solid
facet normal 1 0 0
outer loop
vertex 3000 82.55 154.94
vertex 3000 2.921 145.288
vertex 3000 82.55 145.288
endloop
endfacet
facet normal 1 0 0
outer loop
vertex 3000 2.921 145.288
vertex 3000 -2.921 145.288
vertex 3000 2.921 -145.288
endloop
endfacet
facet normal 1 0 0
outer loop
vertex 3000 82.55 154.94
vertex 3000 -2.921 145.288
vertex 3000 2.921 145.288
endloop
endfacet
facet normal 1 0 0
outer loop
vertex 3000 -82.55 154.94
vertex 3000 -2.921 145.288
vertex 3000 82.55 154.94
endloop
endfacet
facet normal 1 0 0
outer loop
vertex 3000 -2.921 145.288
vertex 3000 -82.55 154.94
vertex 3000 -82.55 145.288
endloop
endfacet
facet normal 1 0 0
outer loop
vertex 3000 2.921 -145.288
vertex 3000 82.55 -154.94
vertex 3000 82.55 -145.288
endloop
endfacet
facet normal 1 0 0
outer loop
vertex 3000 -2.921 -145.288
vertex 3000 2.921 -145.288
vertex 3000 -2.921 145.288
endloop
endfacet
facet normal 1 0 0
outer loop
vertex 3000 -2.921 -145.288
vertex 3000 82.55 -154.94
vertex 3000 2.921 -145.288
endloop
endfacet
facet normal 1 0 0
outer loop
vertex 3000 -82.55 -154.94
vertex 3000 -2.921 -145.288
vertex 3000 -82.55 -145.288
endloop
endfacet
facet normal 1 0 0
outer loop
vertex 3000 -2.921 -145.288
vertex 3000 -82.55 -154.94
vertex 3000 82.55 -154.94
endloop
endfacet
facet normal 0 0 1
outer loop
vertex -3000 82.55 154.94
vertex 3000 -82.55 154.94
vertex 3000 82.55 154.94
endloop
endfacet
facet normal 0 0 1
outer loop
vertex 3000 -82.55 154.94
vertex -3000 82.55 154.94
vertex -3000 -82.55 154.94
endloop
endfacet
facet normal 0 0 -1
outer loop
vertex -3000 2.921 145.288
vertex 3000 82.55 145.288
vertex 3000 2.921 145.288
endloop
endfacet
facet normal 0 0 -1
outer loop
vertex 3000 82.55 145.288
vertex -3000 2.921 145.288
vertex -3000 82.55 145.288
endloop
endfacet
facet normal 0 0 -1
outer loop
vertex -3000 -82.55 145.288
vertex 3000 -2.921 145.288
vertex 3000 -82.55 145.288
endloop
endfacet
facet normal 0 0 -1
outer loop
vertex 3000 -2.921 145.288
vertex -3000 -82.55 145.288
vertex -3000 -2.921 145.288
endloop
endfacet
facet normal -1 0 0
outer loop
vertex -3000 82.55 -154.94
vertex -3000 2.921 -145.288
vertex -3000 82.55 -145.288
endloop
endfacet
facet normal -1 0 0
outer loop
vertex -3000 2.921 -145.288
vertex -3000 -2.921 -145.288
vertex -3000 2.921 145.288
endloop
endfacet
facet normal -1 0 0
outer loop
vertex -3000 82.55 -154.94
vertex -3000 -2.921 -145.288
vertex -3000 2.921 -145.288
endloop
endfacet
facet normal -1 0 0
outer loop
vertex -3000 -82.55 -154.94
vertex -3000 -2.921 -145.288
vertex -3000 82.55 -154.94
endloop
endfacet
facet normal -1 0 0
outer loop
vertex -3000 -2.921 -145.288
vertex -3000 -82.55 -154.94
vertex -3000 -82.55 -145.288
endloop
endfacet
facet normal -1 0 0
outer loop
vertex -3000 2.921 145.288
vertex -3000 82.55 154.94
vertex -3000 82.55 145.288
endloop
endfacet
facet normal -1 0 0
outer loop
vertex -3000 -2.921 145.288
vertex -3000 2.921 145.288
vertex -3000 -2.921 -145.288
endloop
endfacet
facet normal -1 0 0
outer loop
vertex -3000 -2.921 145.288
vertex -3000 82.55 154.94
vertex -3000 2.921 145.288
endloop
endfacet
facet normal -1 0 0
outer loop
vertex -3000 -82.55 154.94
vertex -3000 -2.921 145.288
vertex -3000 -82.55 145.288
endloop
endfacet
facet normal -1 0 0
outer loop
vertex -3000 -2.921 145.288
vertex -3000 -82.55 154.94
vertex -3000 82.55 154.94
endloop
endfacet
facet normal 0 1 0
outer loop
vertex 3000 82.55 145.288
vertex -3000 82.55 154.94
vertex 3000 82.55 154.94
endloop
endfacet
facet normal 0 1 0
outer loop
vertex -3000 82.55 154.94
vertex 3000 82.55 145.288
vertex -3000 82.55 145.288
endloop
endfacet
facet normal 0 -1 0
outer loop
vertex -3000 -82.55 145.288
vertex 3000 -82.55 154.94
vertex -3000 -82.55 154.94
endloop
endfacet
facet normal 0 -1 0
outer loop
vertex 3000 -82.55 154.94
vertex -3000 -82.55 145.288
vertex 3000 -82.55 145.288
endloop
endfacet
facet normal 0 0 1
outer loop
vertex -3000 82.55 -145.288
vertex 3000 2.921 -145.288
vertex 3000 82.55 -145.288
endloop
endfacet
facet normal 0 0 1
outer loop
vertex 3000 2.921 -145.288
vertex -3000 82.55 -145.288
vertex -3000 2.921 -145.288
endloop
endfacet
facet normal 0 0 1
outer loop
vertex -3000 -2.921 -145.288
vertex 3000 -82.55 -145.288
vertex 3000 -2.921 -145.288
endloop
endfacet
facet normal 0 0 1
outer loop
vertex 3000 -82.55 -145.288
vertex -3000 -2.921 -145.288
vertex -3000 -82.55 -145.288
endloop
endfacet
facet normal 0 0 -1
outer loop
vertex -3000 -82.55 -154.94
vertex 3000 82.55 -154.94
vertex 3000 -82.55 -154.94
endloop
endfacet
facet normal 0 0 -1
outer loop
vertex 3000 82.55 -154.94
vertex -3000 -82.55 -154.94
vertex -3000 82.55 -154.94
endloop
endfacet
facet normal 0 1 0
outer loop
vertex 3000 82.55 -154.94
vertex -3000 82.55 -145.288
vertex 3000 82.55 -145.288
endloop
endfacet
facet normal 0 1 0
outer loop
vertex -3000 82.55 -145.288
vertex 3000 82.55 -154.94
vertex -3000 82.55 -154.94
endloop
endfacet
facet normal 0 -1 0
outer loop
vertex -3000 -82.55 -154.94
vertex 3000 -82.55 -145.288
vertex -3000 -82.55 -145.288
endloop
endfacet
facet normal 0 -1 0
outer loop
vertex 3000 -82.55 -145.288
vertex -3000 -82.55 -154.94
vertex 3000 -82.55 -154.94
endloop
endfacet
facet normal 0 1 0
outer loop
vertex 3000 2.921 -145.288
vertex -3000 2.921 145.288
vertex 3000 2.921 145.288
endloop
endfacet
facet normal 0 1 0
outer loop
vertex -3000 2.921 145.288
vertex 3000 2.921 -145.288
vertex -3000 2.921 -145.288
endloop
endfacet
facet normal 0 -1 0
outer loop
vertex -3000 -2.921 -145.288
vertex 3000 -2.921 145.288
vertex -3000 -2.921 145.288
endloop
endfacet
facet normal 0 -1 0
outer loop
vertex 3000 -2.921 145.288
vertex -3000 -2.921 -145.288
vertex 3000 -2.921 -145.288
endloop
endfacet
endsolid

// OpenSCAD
// W-shape steel beam (typical W12x26). Used as obstruction
// CubiCasa can't detect; pipes route AROUND via Arm Around tool.
// Local origin = beam centerline, length = X axis.
// V2 Phase 4.1.
//
// Structural obstruction — no pipe connection, so no @port.

// @part beam
// @kind structural
// @category arch.beam
// @display-name "Steel Beam W12x26 (20' span)"
// @mfg other
// @mfg-pn W12X26
// @price-usd 420.00
// @install-minutes 45
// @crew foreman
// @param length_m number[1,12] default=6 label="Length" unit="m"

length_m = 6.0;          // beam clear span
flange_w_in = 6.5;       // W12x26 flange width
depth_in = 12.2;         // W12x26 depth
flange_t_in = 0.38;
web_t_in = 0.23;

mm_per_in = 25.4;
length_mm = length_m * 1000;
flange_w_mm = flange_w_in * mm_per_in;
depth_mm = depth_in * mm_per_in;
flange_t_mm = flange_t_in * mm_per_in;
web_t_mm = web_t_in * mm_per_in;

// Top flange
translate([0, 0, depth_mm / 2 - flange_t_mm / 2])
    cube(size = [length_mm, flange_w_mm, flange_t_mm], center = true);

// Bottom flange
translate([0, 0, -depth_mm / 2 + flange_t_mm / 2])
    cube(size = [length_mm, flange_w_mm, flange_t_mm], center = true);

// Web
cube(size = [length_mm, web_t_mm, depth_mm - 2 * flange_t_mm],
     center = true);
